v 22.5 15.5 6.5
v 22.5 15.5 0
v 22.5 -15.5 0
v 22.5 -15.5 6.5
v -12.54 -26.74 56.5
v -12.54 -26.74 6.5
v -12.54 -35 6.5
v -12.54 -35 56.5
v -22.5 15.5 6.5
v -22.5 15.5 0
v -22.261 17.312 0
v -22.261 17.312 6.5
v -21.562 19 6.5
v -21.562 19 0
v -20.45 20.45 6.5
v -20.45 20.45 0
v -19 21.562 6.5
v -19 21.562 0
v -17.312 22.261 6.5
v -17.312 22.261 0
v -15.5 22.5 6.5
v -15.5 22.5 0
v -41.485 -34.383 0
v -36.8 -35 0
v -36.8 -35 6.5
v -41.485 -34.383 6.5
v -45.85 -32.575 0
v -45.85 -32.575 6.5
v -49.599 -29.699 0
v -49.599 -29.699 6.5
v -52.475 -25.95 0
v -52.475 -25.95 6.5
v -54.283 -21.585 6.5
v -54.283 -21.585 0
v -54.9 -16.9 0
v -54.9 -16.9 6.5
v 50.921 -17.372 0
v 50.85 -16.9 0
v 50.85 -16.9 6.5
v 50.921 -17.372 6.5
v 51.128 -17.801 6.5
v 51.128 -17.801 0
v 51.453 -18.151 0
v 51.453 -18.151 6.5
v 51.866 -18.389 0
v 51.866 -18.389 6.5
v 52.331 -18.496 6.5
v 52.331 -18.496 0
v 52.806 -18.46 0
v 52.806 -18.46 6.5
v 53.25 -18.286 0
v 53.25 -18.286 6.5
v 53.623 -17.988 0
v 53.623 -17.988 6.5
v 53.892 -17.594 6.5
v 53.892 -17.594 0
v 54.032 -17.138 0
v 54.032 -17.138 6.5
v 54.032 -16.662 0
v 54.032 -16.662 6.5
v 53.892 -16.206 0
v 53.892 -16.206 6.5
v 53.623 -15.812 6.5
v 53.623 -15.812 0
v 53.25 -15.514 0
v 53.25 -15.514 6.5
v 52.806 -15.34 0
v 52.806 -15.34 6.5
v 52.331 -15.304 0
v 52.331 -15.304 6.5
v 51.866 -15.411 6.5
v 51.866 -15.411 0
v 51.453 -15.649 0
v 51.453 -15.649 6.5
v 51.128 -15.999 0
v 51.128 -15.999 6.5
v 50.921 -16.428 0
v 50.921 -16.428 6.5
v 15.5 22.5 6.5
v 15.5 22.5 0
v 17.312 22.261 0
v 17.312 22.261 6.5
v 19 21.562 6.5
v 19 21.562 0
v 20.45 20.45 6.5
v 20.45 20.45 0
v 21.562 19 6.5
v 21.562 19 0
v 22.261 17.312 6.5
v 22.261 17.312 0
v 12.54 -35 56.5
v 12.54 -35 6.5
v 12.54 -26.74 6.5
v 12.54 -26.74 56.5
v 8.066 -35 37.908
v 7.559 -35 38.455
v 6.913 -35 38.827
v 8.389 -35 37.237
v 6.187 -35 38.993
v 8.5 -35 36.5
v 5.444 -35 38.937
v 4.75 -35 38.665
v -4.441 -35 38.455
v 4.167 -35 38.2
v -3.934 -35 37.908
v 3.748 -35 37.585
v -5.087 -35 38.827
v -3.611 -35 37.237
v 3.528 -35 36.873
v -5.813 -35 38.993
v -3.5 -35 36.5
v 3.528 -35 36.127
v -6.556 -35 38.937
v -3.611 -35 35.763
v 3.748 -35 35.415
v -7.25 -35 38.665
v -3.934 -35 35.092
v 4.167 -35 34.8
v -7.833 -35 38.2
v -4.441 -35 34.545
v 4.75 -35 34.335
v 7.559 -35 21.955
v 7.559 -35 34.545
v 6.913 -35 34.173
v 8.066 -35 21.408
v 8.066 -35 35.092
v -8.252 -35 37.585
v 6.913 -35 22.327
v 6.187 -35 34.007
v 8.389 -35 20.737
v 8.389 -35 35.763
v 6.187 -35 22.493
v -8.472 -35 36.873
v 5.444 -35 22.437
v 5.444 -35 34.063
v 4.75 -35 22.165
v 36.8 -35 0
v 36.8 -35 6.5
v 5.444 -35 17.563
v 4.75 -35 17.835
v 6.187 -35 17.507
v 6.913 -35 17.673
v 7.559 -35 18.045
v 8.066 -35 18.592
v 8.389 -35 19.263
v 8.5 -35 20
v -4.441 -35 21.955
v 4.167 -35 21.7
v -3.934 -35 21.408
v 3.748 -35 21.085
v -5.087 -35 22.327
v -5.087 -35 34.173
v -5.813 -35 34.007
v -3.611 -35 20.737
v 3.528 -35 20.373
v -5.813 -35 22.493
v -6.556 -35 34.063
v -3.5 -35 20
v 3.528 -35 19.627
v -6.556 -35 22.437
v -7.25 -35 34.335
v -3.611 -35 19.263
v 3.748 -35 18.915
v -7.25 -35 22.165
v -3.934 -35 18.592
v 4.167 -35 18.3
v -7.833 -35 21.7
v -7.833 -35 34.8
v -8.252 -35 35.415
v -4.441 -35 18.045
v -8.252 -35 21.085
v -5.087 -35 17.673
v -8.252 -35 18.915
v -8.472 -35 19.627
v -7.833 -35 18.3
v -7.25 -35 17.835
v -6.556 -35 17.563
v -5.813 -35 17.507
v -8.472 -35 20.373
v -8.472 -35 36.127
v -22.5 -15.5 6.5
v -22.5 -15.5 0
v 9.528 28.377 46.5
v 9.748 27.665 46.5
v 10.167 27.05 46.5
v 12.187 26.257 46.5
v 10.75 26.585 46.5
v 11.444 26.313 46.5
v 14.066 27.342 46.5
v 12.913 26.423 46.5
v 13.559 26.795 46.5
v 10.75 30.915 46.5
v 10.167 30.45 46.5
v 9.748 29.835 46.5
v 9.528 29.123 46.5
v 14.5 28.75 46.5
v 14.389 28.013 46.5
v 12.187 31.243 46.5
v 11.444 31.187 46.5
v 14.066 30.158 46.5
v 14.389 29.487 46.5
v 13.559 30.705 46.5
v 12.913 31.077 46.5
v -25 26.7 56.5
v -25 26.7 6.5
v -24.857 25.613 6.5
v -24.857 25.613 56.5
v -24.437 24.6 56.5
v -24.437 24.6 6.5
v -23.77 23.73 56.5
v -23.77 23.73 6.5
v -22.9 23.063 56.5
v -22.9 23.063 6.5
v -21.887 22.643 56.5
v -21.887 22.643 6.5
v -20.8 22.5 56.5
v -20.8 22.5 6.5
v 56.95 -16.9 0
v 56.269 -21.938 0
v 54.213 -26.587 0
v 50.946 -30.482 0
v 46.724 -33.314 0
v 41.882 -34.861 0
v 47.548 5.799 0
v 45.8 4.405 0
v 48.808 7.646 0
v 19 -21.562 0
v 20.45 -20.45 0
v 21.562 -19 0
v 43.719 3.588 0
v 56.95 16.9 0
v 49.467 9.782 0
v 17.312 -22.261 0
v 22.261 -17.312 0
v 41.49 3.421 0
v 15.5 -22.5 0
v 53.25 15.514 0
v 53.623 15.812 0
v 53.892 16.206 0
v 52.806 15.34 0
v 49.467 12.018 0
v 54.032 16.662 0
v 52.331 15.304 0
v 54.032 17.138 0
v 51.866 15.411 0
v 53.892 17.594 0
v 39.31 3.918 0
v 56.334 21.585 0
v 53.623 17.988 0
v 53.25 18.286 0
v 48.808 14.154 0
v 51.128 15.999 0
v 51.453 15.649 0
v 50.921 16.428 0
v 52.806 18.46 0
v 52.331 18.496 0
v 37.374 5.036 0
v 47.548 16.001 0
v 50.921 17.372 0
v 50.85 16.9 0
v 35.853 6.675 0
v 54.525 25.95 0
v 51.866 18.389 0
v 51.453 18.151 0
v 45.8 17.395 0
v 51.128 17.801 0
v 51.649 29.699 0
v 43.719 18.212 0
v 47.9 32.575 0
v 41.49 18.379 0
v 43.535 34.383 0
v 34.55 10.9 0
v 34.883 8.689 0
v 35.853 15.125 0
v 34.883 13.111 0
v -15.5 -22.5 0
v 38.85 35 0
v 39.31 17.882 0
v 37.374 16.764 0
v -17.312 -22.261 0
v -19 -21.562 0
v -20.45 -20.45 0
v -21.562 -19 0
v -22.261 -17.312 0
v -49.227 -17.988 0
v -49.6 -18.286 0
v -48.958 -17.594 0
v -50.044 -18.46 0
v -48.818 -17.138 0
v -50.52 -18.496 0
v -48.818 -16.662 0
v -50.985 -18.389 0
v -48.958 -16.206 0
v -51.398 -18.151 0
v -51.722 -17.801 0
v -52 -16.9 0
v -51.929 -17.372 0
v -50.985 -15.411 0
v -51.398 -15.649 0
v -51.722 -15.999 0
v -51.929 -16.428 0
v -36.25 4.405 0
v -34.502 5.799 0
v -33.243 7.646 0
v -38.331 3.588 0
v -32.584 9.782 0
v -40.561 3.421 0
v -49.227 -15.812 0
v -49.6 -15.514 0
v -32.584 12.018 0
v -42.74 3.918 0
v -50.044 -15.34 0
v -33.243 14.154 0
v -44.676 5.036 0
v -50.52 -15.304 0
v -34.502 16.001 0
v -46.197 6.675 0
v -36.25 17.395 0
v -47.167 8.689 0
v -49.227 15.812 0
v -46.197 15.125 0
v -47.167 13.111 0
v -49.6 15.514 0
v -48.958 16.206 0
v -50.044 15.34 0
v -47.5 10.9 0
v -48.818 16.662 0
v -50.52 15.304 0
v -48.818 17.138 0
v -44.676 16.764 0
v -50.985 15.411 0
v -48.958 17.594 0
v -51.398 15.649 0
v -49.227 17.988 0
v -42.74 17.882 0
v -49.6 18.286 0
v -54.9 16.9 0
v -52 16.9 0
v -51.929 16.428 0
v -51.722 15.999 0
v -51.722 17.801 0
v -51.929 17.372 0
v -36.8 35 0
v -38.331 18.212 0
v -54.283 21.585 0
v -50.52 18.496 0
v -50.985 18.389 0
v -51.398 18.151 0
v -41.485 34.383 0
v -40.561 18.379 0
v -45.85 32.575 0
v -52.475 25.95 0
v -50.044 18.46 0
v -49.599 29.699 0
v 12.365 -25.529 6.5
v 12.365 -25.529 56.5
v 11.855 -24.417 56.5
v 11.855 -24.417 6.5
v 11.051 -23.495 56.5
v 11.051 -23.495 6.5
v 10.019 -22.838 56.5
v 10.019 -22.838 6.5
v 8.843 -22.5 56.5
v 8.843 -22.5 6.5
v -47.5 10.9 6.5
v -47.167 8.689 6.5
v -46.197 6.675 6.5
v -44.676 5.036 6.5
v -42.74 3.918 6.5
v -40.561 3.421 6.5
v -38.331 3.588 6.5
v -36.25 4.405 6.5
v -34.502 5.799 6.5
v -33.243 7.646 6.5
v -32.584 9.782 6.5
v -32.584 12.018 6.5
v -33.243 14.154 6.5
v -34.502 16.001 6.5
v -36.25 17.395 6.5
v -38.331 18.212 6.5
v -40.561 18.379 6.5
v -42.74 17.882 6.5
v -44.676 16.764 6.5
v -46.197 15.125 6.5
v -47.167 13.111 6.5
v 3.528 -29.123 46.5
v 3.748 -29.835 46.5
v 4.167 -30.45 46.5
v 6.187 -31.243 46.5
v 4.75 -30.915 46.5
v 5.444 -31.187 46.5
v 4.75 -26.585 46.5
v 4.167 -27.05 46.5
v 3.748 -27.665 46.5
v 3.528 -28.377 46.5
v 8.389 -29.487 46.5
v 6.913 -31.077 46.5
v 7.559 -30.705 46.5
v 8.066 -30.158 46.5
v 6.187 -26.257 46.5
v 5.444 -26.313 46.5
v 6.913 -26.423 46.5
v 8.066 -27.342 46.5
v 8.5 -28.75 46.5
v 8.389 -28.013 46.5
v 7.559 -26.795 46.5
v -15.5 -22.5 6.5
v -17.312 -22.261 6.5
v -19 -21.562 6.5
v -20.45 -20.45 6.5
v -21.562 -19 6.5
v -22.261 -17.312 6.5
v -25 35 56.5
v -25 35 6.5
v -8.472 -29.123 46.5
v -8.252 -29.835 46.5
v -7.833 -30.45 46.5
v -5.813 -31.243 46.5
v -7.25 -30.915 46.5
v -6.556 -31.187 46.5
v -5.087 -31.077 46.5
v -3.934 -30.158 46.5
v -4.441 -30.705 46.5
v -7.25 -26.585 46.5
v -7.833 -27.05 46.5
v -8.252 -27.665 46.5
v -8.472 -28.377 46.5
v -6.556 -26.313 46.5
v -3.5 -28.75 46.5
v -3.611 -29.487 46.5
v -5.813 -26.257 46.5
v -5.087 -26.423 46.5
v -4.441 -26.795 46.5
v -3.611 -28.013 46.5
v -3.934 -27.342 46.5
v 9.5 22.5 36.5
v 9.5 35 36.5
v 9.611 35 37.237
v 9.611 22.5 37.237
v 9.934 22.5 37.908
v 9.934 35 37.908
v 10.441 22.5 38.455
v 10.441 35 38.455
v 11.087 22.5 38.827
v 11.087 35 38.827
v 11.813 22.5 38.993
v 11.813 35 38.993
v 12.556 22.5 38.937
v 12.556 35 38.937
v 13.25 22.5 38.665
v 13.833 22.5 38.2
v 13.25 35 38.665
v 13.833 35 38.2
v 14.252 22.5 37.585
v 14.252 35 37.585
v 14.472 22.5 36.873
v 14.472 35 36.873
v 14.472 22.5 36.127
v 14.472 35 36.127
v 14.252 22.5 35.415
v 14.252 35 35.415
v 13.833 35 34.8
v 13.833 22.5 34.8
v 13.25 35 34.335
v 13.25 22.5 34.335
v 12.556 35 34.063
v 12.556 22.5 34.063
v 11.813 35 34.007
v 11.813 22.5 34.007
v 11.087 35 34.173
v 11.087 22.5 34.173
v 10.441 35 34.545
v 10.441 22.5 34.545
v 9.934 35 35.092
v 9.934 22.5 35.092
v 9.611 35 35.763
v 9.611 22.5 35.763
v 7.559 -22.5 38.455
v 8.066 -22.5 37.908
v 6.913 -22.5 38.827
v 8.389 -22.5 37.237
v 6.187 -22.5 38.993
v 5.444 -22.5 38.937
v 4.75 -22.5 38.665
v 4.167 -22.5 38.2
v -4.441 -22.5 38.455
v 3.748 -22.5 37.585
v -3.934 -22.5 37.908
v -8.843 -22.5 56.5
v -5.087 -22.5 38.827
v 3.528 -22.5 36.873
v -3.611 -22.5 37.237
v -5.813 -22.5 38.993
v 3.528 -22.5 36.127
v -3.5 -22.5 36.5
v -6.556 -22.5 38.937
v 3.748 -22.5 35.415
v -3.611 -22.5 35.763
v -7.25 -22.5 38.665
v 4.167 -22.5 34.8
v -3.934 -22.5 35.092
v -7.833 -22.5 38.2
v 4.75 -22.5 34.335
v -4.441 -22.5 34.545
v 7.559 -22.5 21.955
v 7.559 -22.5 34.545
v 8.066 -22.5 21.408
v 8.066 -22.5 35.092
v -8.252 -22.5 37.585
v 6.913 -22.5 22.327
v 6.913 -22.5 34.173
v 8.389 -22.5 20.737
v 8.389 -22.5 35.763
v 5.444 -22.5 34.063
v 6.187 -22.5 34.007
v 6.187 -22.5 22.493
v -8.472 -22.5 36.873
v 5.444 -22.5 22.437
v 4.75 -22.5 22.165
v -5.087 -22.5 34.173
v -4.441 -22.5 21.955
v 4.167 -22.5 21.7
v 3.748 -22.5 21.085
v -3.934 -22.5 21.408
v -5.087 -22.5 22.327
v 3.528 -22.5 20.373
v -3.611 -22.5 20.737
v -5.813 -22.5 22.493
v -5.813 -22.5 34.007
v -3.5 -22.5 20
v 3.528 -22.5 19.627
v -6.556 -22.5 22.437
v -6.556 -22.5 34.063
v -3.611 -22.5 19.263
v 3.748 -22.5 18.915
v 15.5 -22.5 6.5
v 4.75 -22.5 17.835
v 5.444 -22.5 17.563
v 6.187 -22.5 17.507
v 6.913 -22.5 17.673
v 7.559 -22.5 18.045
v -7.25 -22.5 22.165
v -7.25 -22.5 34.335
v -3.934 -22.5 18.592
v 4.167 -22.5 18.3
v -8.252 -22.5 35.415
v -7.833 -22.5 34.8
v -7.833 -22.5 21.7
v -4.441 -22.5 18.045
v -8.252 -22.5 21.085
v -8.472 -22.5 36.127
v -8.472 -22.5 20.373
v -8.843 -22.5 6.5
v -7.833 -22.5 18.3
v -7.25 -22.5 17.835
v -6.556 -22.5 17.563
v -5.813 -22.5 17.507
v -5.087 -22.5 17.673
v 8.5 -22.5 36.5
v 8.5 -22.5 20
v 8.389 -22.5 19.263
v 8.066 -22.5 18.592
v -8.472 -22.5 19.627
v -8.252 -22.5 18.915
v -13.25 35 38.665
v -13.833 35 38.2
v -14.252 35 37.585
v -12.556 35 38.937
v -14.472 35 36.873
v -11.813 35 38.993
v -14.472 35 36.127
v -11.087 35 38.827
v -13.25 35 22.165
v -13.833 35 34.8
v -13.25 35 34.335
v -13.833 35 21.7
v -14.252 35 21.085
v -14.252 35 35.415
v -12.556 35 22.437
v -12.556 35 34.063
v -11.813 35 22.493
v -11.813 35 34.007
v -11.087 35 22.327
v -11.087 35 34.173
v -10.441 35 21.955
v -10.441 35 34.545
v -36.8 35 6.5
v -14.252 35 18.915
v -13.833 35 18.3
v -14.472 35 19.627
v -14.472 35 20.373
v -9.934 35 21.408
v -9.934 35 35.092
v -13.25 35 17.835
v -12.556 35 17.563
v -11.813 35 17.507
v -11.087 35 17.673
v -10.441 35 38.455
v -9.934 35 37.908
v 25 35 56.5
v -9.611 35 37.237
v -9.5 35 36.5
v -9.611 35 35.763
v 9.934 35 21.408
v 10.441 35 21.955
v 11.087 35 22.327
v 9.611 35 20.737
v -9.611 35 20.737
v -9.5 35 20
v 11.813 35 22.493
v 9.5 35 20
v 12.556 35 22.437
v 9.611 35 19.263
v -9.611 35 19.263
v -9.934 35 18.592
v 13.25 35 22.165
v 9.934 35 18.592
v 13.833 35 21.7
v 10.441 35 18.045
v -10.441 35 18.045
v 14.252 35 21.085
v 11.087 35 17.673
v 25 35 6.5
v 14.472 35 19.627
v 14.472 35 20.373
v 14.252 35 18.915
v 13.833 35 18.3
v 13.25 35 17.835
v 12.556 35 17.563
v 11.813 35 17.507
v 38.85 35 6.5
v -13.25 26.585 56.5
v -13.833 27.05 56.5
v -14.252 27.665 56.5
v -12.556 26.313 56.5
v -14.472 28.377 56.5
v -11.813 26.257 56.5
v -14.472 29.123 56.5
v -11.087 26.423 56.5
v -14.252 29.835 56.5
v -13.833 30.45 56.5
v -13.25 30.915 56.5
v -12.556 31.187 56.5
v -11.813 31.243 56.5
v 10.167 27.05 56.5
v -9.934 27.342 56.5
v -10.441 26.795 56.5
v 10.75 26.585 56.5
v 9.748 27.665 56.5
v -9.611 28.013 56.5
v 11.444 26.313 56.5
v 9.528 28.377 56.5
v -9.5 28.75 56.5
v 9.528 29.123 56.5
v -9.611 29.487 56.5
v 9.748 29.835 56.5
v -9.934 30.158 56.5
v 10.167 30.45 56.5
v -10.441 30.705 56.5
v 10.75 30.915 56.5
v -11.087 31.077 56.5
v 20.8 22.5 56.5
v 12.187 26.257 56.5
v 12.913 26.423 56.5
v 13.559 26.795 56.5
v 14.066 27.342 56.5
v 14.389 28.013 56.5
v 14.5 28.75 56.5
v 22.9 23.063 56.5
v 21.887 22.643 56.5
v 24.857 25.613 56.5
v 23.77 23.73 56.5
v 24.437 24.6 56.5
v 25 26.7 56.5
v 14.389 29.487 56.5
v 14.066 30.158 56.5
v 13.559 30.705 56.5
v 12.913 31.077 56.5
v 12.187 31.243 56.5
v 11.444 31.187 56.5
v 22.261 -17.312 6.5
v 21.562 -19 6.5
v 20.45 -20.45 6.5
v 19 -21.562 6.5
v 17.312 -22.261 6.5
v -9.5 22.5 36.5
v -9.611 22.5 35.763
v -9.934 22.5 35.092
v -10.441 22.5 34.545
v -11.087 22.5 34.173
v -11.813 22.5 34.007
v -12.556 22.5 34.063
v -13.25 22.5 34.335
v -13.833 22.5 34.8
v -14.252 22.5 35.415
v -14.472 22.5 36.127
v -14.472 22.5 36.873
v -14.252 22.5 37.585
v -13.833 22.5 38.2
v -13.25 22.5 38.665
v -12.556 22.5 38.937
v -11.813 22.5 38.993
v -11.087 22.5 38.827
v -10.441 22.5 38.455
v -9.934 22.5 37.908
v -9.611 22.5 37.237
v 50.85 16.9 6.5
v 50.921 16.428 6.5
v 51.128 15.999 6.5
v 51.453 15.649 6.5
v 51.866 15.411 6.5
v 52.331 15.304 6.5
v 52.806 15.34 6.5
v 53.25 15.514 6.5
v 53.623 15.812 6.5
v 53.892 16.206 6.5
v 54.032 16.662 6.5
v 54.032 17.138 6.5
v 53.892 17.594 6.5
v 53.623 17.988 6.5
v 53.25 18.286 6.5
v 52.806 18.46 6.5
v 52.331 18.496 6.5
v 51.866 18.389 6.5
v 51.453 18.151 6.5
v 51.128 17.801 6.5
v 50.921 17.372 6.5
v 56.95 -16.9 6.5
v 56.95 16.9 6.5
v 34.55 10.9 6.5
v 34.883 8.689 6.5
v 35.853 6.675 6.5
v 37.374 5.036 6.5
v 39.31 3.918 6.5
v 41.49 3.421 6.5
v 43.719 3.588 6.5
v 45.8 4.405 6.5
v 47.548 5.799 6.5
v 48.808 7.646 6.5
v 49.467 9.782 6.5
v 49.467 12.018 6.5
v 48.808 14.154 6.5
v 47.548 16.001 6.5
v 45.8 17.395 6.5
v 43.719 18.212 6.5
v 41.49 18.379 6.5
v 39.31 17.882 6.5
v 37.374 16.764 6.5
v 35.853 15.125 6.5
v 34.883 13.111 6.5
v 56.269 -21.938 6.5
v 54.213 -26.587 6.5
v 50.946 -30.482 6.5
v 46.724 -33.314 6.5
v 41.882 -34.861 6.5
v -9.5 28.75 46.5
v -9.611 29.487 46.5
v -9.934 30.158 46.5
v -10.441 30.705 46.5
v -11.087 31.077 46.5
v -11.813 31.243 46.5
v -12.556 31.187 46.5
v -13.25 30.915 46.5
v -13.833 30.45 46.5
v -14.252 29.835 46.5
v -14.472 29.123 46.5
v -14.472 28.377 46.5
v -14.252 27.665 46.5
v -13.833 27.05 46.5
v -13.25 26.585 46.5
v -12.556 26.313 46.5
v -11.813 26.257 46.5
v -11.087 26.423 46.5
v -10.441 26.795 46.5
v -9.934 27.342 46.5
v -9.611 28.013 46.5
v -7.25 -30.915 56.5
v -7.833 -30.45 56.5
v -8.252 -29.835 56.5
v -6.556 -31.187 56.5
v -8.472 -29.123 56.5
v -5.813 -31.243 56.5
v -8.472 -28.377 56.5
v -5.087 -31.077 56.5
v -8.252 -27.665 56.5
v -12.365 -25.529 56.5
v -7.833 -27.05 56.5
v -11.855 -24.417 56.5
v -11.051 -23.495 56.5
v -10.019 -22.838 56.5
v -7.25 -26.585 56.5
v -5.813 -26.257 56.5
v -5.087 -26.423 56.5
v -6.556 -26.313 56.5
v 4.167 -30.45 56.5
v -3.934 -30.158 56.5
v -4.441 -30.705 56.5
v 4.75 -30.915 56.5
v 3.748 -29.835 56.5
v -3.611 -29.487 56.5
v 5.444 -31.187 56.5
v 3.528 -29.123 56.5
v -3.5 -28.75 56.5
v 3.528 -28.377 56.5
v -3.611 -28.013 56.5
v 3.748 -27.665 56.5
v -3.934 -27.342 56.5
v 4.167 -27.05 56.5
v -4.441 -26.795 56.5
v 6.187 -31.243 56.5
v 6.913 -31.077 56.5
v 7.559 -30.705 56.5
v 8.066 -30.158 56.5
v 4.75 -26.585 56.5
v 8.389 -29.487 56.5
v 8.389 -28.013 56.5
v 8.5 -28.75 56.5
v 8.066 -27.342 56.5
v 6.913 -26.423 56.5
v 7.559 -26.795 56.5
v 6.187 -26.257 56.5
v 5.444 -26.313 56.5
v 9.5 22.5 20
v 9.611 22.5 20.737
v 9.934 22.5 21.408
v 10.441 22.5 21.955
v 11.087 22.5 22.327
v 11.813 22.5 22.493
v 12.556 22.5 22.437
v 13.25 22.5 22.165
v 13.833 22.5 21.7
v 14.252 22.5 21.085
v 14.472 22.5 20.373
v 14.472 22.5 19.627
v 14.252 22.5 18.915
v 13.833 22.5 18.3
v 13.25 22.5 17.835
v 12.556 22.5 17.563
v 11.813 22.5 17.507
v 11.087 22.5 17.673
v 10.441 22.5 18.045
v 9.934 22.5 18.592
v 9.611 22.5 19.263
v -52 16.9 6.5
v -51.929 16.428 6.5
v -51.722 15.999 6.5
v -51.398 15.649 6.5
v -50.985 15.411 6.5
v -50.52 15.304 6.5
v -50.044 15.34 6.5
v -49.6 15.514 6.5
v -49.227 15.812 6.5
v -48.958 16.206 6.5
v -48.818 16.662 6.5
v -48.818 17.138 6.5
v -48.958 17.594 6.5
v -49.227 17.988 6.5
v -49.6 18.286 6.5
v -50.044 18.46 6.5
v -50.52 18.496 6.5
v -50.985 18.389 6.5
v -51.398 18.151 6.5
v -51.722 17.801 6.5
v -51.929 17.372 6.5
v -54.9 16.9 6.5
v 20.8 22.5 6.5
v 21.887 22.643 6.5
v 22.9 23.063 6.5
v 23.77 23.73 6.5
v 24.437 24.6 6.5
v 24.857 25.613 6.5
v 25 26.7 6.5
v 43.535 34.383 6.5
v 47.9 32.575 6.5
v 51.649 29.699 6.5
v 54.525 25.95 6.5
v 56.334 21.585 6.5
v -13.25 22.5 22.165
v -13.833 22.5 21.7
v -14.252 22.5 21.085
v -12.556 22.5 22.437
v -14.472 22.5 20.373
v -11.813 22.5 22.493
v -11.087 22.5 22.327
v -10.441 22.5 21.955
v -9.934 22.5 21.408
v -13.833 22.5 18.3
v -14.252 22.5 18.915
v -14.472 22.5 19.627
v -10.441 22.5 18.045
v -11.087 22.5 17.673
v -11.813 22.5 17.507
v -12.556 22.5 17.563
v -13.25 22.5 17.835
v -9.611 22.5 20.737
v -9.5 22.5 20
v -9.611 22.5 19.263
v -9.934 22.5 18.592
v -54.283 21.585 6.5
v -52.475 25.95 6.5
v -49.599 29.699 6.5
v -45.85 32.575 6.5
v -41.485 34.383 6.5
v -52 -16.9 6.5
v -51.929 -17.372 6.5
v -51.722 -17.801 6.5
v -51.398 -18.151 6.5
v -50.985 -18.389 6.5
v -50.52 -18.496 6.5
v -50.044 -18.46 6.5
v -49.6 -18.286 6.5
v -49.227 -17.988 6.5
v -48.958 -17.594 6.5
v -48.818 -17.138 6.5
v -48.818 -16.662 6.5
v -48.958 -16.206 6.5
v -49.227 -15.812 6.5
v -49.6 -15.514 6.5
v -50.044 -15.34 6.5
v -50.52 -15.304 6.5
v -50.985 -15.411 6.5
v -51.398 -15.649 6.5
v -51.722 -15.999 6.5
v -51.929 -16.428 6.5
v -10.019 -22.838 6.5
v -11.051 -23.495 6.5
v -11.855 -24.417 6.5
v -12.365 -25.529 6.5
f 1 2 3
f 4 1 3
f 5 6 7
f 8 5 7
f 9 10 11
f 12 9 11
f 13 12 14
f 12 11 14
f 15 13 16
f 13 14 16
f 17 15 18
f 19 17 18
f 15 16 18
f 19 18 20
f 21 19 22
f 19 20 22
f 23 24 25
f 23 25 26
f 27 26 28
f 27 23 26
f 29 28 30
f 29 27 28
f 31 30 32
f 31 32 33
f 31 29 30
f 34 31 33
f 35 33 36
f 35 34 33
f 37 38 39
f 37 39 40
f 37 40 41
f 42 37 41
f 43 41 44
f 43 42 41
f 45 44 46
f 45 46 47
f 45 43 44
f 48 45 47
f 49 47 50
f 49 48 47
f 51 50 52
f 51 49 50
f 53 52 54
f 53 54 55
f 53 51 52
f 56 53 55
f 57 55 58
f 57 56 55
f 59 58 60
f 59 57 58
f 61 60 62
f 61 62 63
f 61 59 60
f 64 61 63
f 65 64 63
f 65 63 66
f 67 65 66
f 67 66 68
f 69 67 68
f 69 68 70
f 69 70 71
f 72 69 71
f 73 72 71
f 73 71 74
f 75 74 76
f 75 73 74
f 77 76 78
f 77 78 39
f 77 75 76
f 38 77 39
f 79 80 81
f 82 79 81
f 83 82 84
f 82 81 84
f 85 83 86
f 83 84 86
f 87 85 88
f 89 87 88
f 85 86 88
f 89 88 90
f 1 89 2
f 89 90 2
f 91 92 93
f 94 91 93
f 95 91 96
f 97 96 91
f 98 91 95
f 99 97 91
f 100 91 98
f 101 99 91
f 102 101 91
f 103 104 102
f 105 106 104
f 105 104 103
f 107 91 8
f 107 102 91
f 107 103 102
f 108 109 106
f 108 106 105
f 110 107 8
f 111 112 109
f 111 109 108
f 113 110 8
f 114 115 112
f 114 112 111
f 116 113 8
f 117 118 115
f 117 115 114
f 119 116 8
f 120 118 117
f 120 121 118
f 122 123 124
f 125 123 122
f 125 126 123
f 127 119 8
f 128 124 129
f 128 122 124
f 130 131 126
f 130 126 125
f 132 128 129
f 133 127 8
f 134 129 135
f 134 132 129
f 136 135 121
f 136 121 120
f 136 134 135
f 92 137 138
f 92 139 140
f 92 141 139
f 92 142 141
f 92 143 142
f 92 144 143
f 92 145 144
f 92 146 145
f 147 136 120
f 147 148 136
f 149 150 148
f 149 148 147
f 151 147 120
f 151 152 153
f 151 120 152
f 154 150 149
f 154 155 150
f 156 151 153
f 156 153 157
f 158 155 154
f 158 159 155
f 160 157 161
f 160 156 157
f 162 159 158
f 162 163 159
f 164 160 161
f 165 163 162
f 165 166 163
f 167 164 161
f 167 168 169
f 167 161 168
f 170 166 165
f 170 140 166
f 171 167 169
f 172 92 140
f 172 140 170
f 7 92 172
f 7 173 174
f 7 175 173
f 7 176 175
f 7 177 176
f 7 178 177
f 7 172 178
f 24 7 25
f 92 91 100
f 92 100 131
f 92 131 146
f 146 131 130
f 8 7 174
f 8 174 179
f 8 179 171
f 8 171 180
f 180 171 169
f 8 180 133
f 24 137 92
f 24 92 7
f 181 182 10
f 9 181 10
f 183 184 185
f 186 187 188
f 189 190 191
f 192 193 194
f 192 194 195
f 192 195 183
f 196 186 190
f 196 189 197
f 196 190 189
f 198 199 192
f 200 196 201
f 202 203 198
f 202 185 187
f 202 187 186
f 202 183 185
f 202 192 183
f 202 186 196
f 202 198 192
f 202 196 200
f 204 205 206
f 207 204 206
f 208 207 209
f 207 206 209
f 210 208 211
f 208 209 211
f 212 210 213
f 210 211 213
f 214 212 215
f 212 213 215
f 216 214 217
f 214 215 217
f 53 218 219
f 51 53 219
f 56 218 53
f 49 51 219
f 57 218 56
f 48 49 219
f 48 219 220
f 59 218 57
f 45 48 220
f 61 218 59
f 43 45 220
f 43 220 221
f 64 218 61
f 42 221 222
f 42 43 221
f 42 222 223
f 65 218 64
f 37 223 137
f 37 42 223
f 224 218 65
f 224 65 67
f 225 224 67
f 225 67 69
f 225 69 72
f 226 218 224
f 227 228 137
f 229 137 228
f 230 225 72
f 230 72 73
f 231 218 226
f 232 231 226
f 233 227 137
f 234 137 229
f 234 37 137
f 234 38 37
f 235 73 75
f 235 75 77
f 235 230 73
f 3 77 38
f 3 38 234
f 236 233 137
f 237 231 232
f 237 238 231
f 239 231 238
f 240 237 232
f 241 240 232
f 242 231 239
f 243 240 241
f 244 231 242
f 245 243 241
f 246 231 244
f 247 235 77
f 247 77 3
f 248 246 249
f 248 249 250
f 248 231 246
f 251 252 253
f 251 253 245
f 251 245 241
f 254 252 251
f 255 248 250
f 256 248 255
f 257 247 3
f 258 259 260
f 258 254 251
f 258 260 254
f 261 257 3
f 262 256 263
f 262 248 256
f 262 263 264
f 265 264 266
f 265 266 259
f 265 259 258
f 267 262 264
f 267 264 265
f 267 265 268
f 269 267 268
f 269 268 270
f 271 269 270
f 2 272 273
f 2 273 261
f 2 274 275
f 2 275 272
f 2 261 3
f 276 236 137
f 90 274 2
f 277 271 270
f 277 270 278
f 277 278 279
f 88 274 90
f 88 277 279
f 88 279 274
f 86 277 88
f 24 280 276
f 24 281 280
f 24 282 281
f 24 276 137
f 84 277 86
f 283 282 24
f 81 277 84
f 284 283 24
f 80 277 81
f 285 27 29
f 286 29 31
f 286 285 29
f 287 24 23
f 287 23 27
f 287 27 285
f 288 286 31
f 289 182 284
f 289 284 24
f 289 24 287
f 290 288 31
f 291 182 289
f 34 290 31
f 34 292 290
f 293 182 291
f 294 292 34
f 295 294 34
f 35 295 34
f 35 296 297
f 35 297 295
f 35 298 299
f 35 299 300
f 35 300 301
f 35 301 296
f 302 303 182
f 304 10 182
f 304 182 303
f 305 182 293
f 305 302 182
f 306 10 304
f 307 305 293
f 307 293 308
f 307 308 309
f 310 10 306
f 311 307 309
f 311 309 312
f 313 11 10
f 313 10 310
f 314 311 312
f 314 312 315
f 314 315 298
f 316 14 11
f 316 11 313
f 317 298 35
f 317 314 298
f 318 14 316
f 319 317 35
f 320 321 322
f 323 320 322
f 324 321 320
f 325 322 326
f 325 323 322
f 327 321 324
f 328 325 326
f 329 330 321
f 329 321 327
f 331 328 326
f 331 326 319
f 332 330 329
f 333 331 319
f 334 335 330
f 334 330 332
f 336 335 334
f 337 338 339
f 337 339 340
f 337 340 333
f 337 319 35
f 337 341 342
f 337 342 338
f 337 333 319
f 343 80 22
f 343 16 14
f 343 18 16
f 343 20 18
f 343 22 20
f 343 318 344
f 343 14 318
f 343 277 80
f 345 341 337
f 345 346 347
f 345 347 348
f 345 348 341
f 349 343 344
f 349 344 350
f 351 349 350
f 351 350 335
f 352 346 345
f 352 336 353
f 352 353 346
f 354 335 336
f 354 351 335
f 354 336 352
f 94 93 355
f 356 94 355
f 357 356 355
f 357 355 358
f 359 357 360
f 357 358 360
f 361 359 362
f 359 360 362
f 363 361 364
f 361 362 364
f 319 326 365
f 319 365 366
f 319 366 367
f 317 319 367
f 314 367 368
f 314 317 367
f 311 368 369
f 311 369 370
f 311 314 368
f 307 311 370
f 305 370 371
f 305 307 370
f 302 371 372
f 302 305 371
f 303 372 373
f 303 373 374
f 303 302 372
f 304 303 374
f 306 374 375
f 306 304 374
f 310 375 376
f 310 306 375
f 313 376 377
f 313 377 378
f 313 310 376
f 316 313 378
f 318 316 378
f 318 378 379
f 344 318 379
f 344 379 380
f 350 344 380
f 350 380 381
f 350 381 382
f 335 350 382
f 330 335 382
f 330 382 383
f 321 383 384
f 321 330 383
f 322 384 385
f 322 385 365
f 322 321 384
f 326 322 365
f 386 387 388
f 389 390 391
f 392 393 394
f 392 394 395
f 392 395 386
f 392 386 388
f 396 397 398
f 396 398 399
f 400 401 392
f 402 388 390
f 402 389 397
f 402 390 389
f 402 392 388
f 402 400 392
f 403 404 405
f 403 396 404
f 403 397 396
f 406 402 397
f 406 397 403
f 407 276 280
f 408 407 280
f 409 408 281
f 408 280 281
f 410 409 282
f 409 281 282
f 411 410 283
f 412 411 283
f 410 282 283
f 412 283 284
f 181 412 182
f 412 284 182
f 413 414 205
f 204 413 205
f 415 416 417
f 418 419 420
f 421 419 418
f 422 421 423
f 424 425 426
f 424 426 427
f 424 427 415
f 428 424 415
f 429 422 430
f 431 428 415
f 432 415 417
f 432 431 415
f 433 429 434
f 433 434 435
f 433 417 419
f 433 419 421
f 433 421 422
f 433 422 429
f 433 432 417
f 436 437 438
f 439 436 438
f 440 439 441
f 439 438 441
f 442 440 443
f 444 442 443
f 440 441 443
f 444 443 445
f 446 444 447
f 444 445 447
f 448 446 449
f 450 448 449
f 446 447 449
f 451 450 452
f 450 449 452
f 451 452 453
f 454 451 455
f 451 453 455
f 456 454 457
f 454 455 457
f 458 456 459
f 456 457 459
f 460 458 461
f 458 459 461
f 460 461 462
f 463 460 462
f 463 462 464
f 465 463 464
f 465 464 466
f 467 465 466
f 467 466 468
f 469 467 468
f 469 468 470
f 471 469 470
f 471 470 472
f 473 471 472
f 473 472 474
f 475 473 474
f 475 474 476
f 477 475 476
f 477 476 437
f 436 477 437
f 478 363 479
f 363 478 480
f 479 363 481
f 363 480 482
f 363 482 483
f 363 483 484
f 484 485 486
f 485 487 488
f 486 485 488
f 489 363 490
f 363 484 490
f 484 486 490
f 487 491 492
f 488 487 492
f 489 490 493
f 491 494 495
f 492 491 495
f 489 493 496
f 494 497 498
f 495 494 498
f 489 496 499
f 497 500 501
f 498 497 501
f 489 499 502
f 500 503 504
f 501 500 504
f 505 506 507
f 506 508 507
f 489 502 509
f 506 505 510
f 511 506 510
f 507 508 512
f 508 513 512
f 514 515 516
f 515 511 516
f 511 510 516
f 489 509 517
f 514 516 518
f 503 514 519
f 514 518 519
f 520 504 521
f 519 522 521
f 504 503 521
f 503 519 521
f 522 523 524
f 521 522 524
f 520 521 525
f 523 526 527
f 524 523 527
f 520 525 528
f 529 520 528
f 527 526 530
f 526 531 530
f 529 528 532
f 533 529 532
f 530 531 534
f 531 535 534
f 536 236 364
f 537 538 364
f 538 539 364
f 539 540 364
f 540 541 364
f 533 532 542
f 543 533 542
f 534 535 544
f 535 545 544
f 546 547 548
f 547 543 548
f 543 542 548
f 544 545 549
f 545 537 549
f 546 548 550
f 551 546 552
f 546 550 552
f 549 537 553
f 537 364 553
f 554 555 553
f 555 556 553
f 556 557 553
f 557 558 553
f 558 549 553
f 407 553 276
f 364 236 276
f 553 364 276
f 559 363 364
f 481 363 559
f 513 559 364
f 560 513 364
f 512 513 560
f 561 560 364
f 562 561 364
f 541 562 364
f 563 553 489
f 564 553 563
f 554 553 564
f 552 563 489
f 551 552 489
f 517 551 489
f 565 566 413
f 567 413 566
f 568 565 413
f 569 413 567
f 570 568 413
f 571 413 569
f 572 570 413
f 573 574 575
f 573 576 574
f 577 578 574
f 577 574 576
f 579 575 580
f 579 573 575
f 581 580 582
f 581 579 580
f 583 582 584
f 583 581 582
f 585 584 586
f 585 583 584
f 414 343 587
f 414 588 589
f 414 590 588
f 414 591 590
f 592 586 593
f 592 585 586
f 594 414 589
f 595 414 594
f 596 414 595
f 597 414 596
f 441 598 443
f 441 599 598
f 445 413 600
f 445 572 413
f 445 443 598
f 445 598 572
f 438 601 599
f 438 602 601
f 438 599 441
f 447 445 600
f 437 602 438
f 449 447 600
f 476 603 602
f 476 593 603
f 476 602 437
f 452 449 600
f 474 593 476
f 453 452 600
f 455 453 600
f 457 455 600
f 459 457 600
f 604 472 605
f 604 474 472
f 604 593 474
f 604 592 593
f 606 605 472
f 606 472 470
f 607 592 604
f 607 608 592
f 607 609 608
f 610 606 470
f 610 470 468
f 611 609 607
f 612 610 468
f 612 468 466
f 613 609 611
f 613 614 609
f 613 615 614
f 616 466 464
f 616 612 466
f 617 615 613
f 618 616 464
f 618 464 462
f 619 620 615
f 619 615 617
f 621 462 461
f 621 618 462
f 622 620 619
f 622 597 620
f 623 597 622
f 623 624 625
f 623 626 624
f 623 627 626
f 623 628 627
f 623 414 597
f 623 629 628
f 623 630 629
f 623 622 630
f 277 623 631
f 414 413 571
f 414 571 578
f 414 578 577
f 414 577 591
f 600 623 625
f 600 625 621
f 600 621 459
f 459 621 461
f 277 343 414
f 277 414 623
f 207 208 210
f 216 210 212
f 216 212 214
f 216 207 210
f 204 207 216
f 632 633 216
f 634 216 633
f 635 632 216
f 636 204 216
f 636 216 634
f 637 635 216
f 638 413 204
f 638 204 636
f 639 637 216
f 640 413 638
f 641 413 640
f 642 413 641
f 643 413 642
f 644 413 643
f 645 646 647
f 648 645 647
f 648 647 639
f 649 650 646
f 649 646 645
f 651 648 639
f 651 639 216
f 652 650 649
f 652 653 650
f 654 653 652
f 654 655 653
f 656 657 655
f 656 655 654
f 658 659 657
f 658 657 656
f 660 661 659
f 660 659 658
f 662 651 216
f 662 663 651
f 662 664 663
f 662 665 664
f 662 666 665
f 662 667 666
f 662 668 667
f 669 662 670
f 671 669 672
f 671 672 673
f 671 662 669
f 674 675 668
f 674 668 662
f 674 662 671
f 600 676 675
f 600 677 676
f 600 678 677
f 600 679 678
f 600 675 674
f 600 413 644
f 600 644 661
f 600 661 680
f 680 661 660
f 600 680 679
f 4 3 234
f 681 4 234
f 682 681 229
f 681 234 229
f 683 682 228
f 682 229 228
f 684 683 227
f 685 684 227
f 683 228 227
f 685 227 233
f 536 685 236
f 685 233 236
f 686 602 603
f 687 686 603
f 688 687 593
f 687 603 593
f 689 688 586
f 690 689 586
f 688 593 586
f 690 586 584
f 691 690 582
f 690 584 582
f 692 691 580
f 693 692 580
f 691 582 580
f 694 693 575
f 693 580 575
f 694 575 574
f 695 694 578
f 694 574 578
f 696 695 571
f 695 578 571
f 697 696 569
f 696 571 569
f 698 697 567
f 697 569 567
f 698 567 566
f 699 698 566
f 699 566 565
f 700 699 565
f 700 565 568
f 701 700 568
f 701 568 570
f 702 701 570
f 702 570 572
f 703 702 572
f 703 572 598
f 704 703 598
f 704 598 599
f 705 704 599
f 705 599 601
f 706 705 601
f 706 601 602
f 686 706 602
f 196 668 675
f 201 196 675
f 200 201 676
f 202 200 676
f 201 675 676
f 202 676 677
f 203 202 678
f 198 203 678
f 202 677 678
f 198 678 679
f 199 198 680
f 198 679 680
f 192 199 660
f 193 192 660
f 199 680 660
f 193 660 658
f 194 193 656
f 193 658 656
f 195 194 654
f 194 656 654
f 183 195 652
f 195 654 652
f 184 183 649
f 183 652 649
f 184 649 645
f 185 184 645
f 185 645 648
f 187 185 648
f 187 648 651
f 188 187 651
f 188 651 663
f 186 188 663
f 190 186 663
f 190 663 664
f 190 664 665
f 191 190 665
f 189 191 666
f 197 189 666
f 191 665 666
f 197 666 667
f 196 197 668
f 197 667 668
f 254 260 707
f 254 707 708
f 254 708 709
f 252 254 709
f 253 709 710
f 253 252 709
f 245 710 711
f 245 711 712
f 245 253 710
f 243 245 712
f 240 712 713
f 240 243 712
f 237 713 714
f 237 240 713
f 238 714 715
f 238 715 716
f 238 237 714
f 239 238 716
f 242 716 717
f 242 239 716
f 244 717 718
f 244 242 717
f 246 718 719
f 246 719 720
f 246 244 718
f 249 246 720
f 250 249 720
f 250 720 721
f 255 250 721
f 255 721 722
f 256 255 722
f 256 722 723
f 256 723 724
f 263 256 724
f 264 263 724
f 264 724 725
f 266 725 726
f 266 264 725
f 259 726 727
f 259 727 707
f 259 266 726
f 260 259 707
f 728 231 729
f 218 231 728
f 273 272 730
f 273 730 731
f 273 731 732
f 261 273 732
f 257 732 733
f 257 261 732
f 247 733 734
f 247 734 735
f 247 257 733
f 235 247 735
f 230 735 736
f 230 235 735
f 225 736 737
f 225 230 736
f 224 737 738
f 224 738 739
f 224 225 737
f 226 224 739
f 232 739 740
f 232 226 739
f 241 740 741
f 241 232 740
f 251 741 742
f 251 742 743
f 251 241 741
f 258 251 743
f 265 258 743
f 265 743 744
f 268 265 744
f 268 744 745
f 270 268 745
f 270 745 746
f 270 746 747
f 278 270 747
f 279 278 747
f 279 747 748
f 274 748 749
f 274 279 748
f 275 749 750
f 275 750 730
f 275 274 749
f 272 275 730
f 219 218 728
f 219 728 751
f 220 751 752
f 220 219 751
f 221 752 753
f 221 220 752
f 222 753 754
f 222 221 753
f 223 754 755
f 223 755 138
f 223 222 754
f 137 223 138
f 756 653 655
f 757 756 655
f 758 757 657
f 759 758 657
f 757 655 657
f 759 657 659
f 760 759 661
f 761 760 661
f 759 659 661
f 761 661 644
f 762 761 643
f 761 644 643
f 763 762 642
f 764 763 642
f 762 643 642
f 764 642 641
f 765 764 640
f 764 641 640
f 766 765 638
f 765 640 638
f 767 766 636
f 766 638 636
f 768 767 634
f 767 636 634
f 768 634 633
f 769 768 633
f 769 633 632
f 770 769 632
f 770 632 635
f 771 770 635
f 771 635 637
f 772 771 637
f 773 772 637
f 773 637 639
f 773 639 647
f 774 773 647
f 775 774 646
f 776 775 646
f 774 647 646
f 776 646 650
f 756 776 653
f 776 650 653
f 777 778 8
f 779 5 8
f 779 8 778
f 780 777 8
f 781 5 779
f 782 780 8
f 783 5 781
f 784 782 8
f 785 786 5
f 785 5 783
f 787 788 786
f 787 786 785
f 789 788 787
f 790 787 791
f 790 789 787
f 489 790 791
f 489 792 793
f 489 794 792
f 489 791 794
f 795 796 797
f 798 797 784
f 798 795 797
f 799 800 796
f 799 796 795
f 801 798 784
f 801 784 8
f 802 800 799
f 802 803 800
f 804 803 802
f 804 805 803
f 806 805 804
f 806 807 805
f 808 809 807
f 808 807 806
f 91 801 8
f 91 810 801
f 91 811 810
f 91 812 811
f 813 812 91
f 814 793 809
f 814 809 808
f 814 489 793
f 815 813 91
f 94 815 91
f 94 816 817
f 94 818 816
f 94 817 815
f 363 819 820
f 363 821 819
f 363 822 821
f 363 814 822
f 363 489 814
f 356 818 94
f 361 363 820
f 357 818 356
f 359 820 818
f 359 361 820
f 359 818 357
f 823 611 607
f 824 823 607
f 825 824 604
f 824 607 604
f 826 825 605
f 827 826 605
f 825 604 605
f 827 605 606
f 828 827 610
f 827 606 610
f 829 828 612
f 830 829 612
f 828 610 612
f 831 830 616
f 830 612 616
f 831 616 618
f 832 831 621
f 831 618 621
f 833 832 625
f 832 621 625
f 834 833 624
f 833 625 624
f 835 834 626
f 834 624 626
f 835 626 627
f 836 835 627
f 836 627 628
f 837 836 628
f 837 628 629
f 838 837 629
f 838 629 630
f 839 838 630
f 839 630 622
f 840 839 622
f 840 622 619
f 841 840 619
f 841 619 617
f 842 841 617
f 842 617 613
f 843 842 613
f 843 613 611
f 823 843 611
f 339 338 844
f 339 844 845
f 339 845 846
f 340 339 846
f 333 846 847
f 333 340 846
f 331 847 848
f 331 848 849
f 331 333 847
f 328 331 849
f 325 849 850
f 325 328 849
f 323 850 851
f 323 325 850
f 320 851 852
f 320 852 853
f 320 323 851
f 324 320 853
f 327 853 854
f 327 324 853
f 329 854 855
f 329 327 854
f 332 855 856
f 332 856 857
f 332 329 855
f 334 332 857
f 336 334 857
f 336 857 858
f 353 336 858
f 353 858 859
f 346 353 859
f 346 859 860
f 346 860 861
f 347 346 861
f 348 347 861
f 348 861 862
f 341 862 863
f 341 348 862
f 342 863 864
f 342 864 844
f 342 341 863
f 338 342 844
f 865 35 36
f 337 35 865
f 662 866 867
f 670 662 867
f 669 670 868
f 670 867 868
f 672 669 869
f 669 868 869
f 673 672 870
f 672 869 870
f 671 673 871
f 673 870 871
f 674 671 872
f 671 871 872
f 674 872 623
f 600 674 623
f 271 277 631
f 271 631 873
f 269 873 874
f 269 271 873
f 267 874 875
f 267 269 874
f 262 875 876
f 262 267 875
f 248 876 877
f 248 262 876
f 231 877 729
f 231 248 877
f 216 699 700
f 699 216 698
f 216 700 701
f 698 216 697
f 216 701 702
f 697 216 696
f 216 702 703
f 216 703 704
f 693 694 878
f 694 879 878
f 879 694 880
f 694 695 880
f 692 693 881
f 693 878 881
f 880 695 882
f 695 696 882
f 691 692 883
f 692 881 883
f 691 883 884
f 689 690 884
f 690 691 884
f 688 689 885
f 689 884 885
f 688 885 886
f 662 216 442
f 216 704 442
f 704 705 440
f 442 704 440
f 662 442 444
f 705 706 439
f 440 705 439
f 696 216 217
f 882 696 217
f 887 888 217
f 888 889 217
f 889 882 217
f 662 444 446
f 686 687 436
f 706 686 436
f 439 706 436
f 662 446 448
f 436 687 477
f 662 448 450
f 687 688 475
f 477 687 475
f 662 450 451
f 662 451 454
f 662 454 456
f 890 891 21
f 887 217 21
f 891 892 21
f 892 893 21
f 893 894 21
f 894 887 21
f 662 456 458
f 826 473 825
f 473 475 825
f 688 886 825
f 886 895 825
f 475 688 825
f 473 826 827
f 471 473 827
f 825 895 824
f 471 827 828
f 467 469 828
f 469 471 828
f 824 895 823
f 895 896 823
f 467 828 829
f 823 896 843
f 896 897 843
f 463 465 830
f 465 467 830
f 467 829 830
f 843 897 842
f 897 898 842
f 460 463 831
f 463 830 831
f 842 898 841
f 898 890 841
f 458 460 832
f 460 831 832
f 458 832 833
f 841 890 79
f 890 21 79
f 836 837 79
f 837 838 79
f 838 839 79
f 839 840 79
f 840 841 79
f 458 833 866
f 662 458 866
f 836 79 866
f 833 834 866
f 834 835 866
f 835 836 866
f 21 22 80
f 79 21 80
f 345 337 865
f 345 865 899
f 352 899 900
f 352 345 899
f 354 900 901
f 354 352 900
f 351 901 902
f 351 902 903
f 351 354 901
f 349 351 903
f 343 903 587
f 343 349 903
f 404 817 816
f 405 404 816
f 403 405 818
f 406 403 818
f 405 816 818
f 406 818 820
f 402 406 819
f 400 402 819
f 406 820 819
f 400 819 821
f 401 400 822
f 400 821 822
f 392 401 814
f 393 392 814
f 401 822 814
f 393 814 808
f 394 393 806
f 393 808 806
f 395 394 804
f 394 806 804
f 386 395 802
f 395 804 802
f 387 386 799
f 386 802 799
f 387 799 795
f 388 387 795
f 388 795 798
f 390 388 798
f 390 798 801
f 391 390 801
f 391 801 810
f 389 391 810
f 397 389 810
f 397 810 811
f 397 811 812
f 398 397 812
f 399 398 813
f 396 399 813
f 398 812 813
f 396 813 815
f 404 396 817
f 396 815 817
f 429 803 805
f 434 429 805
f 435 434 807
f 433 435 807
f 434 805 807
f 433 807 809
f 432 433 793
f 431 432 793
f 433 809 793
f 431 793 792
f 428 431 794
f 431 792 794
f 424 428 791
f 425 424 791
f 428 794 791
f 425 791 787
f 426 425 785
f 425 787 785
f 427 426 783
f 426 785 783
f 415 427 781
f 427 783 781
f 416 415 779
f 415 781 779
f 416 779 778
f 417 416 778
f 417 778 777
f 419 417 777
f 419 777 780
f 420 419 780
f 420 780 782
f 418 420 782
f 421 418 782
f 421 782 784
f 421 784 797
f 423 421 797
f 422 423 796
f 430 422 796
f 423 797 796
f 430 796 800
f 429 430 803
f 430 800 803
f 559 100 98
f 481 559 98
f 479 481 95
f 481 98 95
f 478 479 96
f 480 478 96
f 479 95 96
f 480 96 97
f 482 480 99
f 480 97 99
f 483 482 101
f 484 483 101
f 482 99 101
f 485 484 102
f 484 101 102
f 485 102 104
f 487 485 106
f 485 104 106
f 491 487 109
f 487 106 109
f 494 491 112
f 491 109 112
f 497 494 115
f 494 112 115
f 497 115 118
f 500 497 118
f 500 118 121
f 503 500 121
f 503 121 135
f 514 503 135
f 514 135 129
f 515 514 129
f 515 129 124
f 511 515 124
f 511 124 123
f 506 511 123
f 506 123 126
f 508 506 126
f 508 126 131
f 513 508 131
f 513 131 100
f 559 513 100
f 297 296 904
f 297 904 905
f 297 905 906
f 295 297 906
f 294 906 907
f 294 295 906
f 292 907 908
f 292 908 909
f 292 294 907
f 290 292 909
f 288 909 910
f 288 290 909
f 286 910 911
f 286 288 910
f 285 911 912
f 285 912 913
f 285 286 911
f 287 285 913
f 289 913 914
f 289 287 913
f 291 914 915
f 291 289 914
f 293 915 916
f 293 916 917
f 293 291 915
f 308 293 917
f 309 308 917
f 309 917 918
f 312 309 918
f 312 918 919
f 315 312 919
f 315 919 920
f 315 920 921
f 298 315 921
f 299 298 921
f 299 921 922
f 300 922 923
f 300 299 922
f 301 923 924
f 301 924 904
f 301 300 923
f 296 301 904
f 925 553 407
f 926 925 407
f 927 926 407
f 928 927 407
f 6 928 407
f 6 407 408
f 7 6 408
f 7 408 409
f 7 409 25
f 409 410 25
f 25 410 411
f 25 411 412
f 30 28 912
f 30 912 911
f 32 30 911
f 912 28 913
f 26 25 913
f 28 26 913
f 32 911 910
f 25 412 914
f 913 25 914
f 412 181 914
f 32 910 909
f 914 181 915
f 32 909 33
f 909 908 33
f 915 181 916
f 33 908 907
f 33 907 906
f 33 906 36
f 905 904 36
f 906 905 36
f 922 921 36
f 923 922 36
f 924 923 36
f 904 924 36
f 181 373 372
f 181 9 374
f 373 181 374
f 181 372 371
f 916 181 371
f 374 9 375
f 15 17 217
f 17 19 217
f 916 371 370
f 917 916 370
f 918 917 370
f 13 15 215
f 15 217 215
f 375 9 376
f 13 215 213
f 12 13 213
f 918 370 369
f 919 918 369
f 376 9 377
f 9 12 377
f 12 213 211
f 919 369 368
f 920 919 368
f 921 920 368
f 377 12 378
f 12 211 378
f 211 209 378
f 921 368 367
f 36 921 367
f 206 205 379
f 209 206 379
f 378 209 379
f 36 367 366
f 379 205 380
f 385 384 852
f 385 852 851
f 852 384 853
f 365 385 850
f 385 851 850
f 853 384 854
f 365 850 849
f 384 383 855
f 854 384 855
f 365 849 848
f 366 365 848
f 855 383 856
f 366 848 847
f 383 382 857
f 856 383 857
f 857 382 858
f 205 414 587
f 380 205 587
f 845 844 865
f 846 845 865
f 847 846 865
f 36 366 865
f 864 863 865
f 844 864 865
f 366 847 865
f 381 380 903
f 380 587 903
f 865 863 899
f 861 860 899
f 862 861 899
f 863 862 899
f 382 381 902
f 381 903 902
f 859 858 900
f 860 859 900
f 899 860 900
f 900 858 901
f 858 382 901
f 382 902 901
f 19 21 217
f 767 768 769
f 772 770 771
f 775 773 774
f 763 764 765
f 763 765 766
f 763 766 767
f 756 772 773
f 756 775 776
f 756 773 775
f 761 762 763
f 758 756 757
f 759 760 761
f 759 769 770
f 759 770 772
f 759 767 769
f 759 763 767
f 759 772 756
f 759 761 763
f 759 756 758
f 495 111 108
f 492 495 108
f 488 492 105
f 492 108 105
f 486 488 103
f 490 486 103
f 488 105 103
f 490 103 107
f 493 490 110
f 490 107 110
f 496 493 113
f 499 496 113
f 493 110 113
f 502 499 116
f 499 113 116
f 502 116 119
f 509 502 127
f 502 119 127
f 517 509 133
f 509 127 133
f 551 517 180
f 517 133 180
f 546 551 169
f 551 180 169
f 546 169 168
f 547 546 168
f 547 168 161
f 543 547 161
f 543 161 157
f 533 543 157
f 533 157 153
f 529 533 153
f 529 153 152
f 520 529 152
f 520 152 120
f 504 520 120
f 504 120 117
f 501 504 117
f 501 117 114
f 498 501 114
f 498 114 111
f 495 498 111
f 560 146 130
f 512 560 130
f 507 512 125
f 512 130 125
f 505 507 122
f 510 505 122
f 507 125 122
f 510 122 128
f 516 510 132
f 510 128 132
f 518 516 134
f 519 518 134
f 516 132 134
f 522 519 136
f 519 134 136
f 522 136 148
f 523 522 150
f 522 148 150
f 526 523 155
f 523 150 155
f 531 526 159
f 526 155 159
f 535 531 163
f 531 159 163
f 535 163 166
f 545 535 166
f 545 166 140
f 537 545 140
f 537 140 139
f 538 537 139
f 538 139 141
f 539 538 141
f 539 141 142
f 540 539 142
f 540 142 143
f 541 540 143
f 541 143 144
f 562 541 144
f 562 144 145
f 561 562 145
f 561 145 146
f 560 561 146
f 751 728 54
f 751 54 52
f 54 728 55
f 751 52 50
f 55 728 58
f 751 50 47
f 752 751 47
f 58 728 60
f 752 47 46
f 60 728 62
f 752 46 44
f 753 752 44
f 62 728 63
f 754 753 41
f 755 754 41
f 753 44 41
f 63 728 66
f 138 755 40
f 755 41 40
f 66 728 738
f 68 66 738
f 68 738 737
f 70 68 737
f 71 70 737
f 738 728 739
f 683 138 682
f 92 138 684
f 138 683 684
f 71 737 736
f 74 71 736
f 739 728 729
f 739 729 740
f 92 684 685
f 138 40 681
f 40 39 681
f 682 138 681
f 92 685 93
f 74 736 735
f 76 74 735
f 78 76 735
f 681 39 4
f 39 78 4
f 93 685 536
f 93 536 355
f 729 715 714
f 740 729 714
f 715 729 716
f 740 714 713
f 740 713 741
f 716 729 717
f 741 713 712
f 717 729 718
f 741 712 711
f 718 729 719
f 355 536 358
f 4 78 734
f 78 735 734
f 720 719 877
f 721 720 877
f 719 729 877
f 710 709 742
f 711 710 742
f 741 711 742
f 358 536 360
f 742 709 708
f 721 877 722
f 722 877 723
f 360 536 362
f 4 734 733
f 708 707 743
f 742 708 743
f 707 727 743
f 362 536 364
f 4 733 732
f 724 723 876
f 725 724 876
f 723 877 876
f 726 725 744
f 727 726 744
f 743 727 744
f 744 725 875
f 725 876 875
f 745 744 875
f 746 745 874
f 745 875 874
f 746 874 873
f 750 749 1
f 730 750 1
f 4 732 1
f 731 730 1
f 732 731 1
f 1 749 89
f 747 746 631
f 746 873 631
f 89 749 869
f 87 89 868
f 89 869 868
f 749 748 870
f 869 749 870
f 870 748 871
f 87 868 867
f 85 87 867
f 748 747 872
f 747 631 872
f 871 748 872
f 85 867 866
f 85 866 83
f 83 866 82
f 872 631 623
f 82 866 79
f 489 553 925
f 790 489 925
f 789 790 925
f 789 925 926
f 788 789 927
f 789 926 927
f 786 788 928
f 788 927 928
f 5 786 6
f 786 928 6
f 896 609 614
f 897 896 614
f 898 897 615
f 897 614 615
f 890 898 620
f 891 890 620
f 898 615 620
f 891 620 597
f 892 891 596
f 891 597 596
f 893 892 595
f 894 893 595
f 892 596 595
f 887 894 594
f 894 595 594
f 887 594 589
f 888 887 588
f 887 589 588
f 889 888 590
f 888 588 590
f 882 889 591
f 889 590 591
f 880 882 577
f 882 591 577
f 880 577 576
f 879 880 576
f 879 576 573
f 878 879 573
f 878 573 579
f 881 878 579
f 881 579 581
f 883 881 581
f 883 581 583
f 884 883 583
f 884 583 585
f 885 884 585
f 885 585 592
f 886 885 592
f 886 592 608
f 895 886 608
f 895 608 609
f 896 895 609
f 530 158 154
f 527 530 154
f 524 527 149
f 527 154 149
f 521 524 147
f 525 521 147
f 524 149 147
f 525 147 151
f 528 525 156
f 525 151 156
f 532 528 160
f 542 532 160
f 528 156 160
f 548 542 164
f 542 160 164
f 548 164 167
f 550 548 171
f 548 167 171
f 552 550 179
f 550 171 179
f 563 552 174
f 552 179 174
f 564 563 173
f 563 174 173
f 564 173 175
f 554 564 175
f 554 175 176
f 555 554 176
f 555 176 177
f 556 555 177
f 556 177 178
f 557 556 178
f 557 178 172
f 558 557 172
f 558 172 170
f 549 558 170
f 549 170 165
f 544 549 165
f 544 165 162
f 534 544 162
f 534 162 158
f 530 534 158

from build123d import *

# Parameters (mm, degrees)
SKETCH_1_R          = 1.6
SKETCH_1_R_2        = 7.5
EXTRUDE_1_DEPTH     = 6.5
EXTRUDE_2_DEPTH     = 50
SKETCH_3_R          = 2.5
CUT_EXTRUDE_1_DEPTH = 10
CUT_EXTRUDE_2_REACH = 108.546
SKETCH_5_R          = 2.5
CUT_EXTRUDE_3_REACH = 108.469
SKETCH_6_R          = 2.5


with BuildPart() as part:
    # 草图1 → 凸台-拉伸1 (new body)
    with BuildSketch(Plane.XY):
        with BuildLine():
            Line((-36.800051208, 35), (38.850303739, 35))
            ThreePointArc((38.850303739, 35), (51.648918374, 29.698640239), (56.950278135, 16.900025604))
            Line((56.950278135, 16.900025604), (56.950278135, -16.900025604))
            ThreePointArc((56.950278135, -16.900025604), (50.945911029, -30.48186799), (36.800051208, -35))
            Line((36.800051208, -35), (-36.800051208, -35))
            ThreePointArc((-36.800051208, -35), (-49.598665842, -29.698640239), (-54.900025604, -16.900025604))
            Line((-54.900025604, -16.900025604), (-54.900025604, 16.900025604))
            ThreePointArc((-54.900025604, 16.900025604), (-49.598665842, 29.698640239), (-36.800051208, 35))
        make_face()
        with Locations(Location((-50.400025604, 16.900025604, 0), (0, 0, 180))):
            Circle(SKETCH_1_R, mode=Mode.SUBTRACT)
        with Locations(Location((-40.000025604, 10.900025604, 0), (0, 0, 180))):
            Circle(SKETCH_1_R_2, mode=Mode.SUBTRACT)
        with Locations(Location((52.450278135, 16.900025604, 0), (0, 0, 180))):
            Circle(SKETCH_1_R, mode=Mode.SUBTRACT)
        with Locations(Location((42.050278135, 10.900025604, 0), (0, 0, 180))):
            Circle(SKETCH_1_R_2, mode=Mode.SUBTRACT)
        with Locations(Location((52.450278135, -16.900025604, 0), (0, 0, 180))):
            Circle(SKETCH_1_R, mode=Mode.SUBTRACT)
        with Locations(Location((-50.400025604, -16.900025604, 0), (0, 0, 180))):
            Circle(SKETCH_1_R, mode=Mode.SUBTRACT)
        with BuildLine():
            Line((-15.5, 22.5), (15.5, 22.5))
            ThreePointArc((15.5, 22.5), (20.449747468, 20.449747468), (22.5, 15.5))
            Line((22.5, 15.5), (22.5, -15.5))
            ThreePointArc((22.5, -15.5), (20.449747468, -20.449747468), (15.5, -22.5))
            Line((15.5, -22.5), (-15.5, -22.5))
            ThreePointArc((-15.5, -22.5), (-20.449747468, -20.449747468), (-22.5, -15.5))
            Line((-22.5, -15.5), (-22.5, 15.5))
            ThreePointArc((-22.5, 15.5), (-20.449747468, 20.449747468), (-15.5, 22.5))
        make_face(mode=Mode.SUBTRACT)
    extrude(amount=EXTRUDE_1_DEPTH)

    # 草图2 → 凸台-拉伸2 (add)
    with BuildSketch(Plane.XY.offset(6.5)):
        with BuildLine():
            Line((8.843450288, -22.5), (-8.843450288, -22.5))
            ThreePointArc((-8.843450288, -22.5), (-11.48607102, -23.92742014), (-12.539948379, -26.739948379))
            Line((-12.539948379, -26.739948379), (-12.539948379, -35))
            Line((-12.539948379, -35), (12.539948379, -35))
            Line((12.539948379, -35), (12.539948379, -26.739948379))
            ThreePointArc((12.539948379, -26.739948379), (11.48607102, -23.92742014), (8.843450288, -22.5))
        make_face()
        with BuildLine():
            Line((-20.8, 22.5), (20.8, 22.5))
            ThreePointArc((20.8, 22.5), (23.769848481, 23.730151519), (25, 26.7))
            Line((25, 26.7), (25, 35))
            Line((25, 35), (-25, 35))
            Line((-25, 35), (-25, 26.7))
            ThreePointArc((-25, 26.7), (-23.769848481, 23.730151519), (-20.8, 22.5))
        make_face()
    extrude(amount=EXTRUDE_2_DEPTH)

    # 草图3 → 切除-拉伸1 (cut)
    with BuildSketch(Plane.XY.offset(56.5)):
        with Locations((-12, 28.75)):
            Circle(SKETCH_3_R)
        with Locations((12, 28.75)):
            Circle(SKETCH_3_R)
        with Locations((-6, -28.75)):
            Circle(SKETCH_3_R)
        with Locations((6, -28.75)):
            Circle(SKETCH_3_R)
    extrude(amount=-CUT_EXTRUDE_1_DEPTH, mode=Mode.SUBTRACT)

    # 草图5 → 切除-拉伸2 (cut, up to next)
    with BuildSketch(Plane(origin=(0, 35, 0), x_dir=(1, 0, 0), z_dir=(0, 1, 0)), mode=Mode.PRIVATE) as cut_extrude_2_sk1:
        with Locations(Location((12, -20, 0), (0, 0, 180))):
            Circle(SKETCH_5_R)
    cut_extrude_2_tool1 = extrude(cut_extrude_2_sk1.sketch, amount=-CUT_EXTRUDE_2_REACH, mode=Mode.PRIVATE) & part.part
    # 草图5 → 切除-拉伸2 (cut, up to next)
    with BuildSketch(Plane(origin=(0, 35, 0), x_dir=(1, 0, 0), z_dir=(0, 1, 0)), mode=Mode.PRIVATE) as cut_extrude_2_sk2:
        with Locations((-12, -20)):
            Circle(SKETCH_5_R)
    cut_extrude_2_tool2 = extrude(cut_extrude_2_sk2.sketch, amount=-CUT_EXTRUDE_2_REACH, mode=Mode.PRIVATE) & part.part
    # 草图5 → 切除-拉伸2 (cut, up to next)
    with BuildSketch(Plane(origin=(0, 35, 0), x_dir=(1, 0, 0), z_dir=(0, 1, 0)), mode=Mode.PRIVATE) as cut_extrude_2_sk3:
        with Locations(Location((12, -36.5, 0), (0, 0, 180))):
            Circle(SKETCH_5_R)
    cut_extrude_2_tool3 = extrude(cut_extrude_2_sk3.sketch, amount=-CUT_EXTRUDE_2_REACH, mode=Mode.PRIVATE) & part.part
    # 草图5 → 切除-拉伸2 (cut, up to next)
    with BuildSketch(Plane(origin=(0, 35, 0), x_dir=(1, 0, 0), z_dir=(0, 1, 0)), mode=Mode.PRIVATE) as cut_extrude_2_sk4:
        with Locations((-12, -36.5)):
            Circle(SKETCH_5_R)
    cut_extrude_2_tool4 = extrude(cut_extrude_2_sk4.sketch, amount=-CUT_EXTRUDE_2_REACH, mode=Mode.PRIVATE) & part.part
    add(cut_extrude_2_tool1.solids().sort_by_distance((12, 35, 20))[0], mode=Mode.SUBTRACT)
    add(cut_extrude_2_tool2.solids().sort_by_distance((-12, 35, 20))[0], mode=Mode.SUBTRACT)
    add(cut_extrude_2_tool3.solids().sort_by_distance((12, 35, 36.5))[0], mode=Mode.SUBTRACT)
    add(cut_extrude_2_tool4.solids().sort_by_distance((-12, 35, 36.5))[0], mode=Mode.SUBTRACT)

    # 草图6 → 切除-拉伸3 (cut, up to next)
    with BuildSketch(Plane.XZ.offset(35), mode=Mode.PRIVATE) as cut_extrude_3_sk1:
        with Locations((-6, 20)):
            Circle(SKETCH_6_R)
    cut_extrude_3_tool1 = extrude(cut_extrude_3_sk1.sketch, amount=-CUT_EXTRUDE_3_REACH, mode=Mode.PRIVATE) & part.part
    # 草图6 → 切除-拉伸3 (cut, up to next)
    with BuildSketch(Plane.XZ.offset(35), mode=Mode.PRIVATE) as cut_extrude_3_sk2:
        with Locations((6, 20)):
            Circle(SKETCH_6_R)
    cut_extrude_3_tool2 = extrude(cut_extrude_3_sk2.sketch, amount=-CUT_EXTRUDE_3_REACH, mode=Mode.PRIVATE) & part.part
    # 草图6 → 切除-拉伸3 (cut, up to next)
    with BuildSketch(Plane.XZ.offset(35), mode=Mode.PRIVATE) as cut_extrude_3_sk3:
        with Locations((-6, 36.5)):
            Circle(SKETCH_6_R)
    cut_extrude_3_tool3 = extrude(cut_extrude_3_sk3.sketch, amount=-CUT_EXTRUDE_3_REACH, mode=Mode.PRIVATE) & part.part
    # 草图6 → 切除-拉伸3 (cut, up to next)
    with BuildSketch(Plane.XZ.offset(35), mode=Mode.PRIVATE) as cut_extrude_3_sk4:
        with Locations((6, 36.5)):
            Circle(SKETCH_6_R)
    cut_extrude_3_tool4 = extrude(cut_extrude_3_sk4.sketch, amount=-CUT_EXTRUDE_3_REACH, mode=Mode.PRIVATE) & part.part
    add(cut_extrude_3_tool1.solids().sort_by_distance((-6, -35, 20))[0], mode=Mode.SUBTRACT)
    add(cut_extrude_3_tool2.solids().sort_by_distance((6, -35, 20))[0], mode=Mode.SUBTRACT)
    add(cut_extrude_3_tool3.solids().sort_by_distance((-6, -35, 36.5))[0], mode=Mode.SUBTRACT)
    add(cut_extrude_3_tool4.solids().sort_by_distance((6, -35, 36.5))[0], mode=Mode.SUBTRACT)


solid = part.part
